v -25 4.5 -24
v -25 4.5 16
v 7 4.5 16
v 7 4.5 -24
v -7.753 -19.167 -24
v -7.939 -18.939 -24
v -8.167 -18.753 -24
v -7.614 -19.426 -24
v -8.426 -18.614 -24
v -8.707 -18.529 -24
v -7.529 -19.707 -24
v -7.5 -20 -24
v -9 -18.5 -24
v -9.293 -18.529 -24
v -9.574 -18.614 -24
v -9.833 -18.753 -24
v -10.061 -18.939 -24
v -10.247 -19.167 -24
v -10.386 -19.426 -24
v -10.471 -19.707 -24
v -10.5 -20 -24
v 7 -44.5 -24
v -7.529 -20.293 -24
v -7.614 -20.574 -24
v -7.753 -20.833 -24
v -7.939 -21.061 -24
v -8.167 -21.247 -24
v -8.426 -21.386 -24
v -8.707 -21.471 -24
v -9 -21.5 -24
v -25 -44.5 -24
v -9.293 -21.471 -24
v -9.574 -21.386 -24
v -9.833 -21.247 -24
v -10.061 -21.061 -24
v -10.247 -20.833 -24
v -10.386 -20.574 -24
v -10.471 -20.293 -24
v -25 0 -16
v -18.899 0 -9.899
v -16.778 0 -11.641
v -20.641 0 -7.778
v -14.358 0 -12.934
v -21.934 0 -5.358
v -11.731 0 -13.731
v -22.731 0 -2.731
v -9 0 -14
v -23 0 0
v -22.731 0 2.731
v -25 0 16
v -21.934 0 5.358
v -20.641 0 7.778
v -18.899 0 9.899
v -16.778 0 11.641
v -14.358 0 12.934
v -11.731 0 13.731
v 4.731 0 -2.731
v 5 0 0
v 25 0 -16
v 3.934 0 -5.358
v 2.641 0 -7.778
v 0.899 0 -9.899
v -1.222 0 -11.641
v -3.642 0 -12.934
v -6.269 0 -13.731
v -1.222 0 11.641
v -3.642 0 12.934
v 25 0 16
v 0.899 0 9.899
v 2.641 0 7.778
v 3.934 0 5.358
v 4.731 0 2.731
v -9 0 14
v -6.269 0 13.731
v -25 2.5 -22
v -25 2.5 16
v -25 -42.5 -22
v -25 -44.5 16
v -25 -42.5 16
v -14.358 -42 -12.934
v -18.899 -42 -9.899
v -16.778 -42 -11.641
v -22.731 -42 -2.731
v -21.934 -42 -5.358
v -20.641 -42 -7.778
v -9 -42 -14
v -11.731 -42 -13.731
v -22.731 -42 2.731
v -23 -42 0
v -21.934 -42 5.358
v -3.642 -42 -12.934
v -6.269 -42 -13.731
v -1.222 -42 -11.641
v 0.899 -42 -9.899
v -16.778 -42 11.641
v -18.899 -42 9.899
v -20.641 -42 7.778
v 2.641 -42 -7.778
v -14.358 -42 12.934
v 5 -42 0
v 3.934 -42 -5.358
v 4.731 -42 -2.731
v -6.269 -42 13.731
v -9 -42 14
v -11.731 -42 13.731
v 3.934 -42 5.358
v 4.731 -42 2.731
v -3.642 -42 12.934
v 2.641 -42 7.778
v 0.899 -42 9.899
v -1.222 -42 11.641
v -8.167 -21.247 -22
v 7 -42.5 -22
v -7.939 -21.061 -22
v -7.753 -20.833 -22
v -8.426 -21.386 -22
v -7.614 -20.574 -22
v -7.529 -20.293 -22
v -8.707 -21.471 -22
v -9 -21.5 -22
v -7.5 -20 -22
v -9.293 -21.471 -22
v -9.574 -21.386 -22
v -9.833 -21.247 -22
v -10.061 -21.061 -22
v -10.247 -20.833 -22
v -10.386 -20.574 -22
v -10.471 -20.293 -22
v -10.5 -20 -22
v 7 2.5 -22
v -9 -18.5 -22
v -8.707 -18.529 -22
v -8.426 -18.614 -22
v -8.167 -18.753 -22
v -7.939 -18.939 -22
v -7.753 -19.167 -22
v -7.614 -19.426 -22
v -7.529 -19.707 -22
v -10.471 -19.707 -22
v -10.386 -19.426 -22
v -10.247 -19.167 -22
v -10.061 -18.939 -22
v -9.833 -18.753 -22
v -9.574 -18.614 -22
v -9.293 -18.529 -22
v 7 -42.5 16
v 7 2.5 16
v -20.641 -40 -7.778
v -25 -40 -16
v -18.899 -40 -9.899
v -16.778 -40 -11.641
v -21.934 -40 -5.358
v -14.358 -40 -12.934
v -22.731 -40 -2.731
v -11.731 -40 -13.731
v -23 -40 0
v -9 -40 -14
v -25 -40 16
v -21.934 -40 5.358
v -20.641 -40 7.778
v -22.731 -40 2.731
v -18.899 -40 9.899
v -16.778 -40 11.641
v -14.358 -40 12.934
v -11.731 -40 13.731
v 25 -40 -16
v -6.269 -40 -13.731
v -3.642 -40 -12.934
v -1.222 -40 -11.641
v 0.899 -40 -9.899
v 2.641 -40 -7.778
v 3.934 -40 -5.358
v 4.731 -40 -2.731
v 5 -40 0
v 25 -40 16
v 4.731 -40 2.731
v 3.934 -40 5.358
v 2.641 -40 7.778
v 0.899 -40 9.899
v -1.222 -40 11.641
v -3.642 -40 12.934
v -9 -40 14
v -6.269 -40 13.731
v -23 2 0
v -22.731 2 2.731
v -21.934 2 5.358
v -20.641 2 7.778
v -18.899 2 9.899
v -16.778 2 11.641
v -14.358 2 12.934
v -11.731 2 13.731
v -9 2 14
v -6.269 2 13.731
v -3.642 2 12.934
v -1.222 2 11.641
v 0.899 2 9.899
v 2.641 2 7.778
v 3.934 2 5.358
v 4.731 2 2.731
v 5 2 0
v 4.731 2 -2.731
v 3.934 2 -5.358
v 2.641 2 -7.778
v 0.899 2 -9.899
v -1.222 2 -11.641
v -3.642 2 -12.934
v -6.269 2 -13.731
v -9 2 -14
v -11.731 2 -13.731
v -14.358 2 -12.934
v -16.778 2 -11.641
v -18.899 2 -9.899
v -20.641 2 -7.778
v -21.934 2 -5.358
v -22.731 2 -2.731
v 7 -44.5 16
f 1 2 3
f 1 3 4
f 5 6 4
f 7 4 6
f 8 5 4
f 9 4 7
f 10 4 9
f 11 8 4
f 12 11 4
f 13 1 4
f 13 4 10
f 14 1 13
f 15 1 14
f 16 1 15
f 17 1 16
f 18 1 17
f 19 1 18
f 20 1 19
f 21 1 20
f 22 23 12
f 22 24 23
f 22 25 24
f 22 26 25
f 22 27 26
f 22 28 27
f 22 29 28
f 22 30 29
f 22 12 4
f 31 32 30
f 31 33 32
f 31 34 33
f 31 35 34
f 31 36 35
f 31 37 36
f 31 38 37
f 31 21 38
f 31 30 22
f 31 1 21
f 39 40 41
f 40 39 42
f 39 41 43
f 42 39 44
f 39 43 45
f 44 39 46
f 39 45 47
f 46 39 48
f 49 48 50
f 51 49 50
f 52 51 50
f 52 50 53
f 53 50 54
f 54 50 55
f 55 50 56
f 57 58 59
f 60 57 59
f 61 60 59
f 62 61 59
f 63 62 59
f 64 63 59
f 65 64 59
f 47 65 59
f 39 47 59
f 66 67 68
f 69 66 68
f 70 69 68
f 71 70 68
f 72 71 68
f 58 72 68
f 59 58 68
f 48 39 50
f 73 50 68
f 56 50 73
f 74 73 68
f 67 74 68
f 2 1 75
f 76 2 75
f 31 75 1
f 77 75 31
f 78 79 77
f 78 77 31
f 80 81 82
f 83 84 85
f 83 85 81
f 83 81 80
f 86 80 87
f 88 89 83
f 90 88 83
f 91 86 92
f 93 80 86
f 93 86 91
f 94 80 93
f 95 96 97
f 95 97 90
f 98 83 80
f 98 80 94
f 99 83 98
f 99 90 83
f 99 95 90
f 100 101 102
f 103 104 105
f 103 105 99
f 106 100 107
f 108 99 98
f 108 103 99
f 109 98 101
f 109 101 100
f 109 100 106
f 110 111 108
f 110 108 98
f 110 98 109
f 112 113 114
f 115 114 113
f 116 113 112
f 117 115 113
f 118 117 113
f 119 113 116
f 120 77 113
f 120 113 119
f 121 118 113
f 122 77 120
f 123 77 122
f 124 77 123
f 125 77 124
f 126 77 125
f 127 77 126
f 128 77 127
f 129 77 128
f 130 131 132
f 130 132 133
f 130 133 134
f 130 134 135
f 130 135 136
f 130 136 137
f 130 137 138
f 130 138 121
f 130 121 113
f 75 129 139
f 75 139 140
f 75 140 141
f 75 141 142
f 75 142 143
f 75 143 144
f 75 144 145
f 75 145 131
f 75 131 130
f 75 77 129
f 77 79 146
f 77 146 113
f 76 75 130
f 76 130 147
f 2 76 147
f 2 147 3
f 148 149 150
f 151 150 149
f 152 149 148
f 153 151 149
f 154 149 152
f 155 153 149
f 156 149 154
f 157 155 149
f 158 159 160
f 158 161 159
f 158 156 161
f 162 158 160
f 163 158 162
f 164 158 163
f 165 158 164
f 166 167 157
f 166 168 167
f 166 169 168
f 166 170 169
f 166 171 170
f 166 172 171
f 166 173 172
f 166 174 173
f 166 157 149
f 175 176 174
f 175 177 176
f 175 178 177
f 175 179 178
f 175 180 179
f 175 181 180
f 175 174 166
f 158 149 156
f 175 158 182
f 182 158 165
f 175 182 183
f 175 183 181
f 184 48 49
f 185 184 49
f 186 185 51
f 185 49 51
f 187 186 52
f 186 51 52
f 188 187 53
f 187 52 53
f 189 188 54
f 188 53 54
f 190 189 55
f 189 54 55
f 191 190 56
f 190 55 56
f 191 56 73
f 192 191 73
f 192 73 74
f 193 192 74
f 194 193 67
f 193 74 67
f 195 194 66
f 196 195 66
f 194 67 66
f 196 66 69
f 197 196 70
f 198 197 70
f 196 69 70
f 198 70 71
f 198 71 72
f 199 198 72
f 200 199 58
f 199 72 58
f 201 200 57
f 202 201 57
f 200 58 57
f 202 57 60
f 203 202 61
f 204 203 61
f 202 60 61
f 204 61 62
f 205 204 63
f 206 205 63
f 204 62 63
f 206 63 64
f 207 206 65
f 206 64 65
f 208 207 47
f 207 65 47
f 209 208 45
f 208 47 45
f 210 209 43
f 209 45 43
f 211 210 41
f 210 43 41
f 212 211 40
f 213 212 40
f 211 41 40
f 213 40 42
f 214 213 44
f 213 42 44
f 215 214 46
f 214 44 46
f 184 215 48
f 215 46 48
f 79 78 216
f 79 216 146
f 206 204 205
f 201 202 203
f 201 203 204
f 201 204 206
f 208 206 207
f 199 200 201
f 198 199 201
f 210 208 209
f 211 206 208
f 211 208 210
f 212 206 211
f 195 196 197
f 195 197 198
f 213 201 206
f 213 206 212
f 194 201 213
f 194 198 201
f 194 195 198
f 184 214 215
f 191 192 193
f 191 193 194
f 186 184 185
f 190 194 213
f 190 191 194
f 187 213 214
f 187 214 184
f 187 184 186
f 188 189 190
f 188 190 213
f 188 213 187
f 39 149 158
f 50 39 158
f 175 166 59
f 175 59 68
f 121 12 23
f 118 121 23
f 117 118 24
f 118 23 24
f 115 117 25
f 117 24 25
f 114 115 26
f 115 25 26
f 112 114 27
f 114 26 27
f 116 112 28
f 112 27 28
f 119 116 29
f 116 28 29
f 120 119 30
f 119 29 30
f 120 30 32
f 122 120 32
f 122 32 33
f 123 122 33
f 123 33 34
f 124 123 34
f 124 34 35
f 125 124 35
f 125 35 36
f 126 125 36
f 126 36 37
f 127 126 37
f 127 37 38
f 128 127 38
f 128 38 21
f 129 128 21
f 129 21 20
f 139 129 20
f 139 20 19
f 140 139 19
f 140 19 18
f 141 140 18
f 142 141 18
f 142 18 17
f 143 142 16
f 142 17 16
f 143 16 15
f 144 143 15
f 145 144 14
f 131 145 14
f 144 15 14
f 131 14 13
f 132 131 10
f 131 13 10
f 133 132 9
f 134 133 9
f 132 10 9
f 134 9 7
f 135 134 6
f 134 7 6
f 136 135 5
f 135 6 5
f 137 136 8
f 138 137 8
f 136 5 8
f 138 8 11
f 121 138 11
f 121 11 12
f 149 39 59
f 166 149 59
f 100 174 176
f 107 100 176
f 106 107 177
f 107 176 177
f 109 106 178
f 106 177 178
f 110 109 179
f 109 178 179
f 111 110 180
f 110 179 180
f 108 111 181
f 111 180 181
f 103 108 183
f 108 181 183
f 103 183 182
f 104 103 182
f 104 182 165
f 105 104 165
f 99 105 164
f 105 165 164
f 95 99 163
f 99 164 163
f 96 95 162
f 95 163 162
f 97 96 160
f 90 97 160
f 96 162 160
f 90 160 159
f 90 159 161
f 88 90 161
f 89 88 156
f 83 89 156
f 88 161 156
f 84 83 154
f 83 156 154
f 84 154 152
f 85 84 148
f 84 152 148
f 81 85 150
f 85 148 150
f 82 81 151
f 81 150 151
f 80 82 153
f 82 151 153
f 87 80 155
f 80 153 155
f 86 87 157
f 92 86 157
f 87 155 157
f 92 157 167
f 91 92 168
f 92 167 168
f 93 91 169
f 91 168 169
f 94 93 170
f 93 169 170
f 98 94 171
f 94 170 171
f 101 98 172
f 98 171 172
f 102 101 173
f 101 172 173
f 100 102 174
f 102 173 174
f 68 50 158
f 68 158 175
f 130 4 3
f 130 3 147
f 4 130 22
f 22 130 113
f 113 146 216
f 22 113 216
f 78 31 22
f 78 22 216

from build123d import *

# Parameters (mm, degrees)
F0_W     = 50
F0_H     = 32
F1_DEPTH = 40
F2_R     = 14
F3_DEPTH = 2
F4_R     = 14
F5_DEPTH = 2
F7_DEPTH = 32
F8_R     = 1.5
F9_DEPTH = 25


with BuildPart() as f1:
    # F0 (on Front) → F1 (new body)
    with BuildSketch(Plane.XZ):
        Rectangle(F0_W, F0_H)
    extrude(amount=F1_DEPTH)

    # F2 (on face) → F3 (join)
    with BuildSketch(Plane.XZ.offset(40)):
        with Locations((-9, 0)):
            Circle(F2_R)
    extrude(amount=F3_DEPTH)

    # F4 (on face) → F5 (join)
    with BuildSketch(Plane(origin=(0, 0, 0), x_dir=(-1, 0, 0), z_dir=(0, 1, 0))):
        with Locations((9, 0)):
            Circle(F4_R)
    extrude(amount=F5_DEPTH)


with BuildPart() as f7:
    # F6 (on face) → F7 (new body)
    with BuildSketch(Plane(origin=(-25, 0, 0), x_dir=(0, -1, 0), z_dir=(-1, 0, 0))):
        Polygon((-2.5, -22), (-2.5, 16), (-4.5, 16), (-4.5, -24), (44.5, -24), (44.5, 16), (42.5, 16), (42.5, -22), align=None)
    extrude(amount=-F7_DEPTH)

    # F8 (on face) → F9 (cut)
    with BuildSketch(Plane(origin=(0, 0, -24), x_dir=(1, 0, 0), z_dir=(0, 0, -1))):
        with Locations((-9, 20)):
            Circle(F8_R)
    extrude(amount=-F9_DEPTH, mode=Mode.SUBTRACT)


solid = Compound([f1.part, f7.part])
